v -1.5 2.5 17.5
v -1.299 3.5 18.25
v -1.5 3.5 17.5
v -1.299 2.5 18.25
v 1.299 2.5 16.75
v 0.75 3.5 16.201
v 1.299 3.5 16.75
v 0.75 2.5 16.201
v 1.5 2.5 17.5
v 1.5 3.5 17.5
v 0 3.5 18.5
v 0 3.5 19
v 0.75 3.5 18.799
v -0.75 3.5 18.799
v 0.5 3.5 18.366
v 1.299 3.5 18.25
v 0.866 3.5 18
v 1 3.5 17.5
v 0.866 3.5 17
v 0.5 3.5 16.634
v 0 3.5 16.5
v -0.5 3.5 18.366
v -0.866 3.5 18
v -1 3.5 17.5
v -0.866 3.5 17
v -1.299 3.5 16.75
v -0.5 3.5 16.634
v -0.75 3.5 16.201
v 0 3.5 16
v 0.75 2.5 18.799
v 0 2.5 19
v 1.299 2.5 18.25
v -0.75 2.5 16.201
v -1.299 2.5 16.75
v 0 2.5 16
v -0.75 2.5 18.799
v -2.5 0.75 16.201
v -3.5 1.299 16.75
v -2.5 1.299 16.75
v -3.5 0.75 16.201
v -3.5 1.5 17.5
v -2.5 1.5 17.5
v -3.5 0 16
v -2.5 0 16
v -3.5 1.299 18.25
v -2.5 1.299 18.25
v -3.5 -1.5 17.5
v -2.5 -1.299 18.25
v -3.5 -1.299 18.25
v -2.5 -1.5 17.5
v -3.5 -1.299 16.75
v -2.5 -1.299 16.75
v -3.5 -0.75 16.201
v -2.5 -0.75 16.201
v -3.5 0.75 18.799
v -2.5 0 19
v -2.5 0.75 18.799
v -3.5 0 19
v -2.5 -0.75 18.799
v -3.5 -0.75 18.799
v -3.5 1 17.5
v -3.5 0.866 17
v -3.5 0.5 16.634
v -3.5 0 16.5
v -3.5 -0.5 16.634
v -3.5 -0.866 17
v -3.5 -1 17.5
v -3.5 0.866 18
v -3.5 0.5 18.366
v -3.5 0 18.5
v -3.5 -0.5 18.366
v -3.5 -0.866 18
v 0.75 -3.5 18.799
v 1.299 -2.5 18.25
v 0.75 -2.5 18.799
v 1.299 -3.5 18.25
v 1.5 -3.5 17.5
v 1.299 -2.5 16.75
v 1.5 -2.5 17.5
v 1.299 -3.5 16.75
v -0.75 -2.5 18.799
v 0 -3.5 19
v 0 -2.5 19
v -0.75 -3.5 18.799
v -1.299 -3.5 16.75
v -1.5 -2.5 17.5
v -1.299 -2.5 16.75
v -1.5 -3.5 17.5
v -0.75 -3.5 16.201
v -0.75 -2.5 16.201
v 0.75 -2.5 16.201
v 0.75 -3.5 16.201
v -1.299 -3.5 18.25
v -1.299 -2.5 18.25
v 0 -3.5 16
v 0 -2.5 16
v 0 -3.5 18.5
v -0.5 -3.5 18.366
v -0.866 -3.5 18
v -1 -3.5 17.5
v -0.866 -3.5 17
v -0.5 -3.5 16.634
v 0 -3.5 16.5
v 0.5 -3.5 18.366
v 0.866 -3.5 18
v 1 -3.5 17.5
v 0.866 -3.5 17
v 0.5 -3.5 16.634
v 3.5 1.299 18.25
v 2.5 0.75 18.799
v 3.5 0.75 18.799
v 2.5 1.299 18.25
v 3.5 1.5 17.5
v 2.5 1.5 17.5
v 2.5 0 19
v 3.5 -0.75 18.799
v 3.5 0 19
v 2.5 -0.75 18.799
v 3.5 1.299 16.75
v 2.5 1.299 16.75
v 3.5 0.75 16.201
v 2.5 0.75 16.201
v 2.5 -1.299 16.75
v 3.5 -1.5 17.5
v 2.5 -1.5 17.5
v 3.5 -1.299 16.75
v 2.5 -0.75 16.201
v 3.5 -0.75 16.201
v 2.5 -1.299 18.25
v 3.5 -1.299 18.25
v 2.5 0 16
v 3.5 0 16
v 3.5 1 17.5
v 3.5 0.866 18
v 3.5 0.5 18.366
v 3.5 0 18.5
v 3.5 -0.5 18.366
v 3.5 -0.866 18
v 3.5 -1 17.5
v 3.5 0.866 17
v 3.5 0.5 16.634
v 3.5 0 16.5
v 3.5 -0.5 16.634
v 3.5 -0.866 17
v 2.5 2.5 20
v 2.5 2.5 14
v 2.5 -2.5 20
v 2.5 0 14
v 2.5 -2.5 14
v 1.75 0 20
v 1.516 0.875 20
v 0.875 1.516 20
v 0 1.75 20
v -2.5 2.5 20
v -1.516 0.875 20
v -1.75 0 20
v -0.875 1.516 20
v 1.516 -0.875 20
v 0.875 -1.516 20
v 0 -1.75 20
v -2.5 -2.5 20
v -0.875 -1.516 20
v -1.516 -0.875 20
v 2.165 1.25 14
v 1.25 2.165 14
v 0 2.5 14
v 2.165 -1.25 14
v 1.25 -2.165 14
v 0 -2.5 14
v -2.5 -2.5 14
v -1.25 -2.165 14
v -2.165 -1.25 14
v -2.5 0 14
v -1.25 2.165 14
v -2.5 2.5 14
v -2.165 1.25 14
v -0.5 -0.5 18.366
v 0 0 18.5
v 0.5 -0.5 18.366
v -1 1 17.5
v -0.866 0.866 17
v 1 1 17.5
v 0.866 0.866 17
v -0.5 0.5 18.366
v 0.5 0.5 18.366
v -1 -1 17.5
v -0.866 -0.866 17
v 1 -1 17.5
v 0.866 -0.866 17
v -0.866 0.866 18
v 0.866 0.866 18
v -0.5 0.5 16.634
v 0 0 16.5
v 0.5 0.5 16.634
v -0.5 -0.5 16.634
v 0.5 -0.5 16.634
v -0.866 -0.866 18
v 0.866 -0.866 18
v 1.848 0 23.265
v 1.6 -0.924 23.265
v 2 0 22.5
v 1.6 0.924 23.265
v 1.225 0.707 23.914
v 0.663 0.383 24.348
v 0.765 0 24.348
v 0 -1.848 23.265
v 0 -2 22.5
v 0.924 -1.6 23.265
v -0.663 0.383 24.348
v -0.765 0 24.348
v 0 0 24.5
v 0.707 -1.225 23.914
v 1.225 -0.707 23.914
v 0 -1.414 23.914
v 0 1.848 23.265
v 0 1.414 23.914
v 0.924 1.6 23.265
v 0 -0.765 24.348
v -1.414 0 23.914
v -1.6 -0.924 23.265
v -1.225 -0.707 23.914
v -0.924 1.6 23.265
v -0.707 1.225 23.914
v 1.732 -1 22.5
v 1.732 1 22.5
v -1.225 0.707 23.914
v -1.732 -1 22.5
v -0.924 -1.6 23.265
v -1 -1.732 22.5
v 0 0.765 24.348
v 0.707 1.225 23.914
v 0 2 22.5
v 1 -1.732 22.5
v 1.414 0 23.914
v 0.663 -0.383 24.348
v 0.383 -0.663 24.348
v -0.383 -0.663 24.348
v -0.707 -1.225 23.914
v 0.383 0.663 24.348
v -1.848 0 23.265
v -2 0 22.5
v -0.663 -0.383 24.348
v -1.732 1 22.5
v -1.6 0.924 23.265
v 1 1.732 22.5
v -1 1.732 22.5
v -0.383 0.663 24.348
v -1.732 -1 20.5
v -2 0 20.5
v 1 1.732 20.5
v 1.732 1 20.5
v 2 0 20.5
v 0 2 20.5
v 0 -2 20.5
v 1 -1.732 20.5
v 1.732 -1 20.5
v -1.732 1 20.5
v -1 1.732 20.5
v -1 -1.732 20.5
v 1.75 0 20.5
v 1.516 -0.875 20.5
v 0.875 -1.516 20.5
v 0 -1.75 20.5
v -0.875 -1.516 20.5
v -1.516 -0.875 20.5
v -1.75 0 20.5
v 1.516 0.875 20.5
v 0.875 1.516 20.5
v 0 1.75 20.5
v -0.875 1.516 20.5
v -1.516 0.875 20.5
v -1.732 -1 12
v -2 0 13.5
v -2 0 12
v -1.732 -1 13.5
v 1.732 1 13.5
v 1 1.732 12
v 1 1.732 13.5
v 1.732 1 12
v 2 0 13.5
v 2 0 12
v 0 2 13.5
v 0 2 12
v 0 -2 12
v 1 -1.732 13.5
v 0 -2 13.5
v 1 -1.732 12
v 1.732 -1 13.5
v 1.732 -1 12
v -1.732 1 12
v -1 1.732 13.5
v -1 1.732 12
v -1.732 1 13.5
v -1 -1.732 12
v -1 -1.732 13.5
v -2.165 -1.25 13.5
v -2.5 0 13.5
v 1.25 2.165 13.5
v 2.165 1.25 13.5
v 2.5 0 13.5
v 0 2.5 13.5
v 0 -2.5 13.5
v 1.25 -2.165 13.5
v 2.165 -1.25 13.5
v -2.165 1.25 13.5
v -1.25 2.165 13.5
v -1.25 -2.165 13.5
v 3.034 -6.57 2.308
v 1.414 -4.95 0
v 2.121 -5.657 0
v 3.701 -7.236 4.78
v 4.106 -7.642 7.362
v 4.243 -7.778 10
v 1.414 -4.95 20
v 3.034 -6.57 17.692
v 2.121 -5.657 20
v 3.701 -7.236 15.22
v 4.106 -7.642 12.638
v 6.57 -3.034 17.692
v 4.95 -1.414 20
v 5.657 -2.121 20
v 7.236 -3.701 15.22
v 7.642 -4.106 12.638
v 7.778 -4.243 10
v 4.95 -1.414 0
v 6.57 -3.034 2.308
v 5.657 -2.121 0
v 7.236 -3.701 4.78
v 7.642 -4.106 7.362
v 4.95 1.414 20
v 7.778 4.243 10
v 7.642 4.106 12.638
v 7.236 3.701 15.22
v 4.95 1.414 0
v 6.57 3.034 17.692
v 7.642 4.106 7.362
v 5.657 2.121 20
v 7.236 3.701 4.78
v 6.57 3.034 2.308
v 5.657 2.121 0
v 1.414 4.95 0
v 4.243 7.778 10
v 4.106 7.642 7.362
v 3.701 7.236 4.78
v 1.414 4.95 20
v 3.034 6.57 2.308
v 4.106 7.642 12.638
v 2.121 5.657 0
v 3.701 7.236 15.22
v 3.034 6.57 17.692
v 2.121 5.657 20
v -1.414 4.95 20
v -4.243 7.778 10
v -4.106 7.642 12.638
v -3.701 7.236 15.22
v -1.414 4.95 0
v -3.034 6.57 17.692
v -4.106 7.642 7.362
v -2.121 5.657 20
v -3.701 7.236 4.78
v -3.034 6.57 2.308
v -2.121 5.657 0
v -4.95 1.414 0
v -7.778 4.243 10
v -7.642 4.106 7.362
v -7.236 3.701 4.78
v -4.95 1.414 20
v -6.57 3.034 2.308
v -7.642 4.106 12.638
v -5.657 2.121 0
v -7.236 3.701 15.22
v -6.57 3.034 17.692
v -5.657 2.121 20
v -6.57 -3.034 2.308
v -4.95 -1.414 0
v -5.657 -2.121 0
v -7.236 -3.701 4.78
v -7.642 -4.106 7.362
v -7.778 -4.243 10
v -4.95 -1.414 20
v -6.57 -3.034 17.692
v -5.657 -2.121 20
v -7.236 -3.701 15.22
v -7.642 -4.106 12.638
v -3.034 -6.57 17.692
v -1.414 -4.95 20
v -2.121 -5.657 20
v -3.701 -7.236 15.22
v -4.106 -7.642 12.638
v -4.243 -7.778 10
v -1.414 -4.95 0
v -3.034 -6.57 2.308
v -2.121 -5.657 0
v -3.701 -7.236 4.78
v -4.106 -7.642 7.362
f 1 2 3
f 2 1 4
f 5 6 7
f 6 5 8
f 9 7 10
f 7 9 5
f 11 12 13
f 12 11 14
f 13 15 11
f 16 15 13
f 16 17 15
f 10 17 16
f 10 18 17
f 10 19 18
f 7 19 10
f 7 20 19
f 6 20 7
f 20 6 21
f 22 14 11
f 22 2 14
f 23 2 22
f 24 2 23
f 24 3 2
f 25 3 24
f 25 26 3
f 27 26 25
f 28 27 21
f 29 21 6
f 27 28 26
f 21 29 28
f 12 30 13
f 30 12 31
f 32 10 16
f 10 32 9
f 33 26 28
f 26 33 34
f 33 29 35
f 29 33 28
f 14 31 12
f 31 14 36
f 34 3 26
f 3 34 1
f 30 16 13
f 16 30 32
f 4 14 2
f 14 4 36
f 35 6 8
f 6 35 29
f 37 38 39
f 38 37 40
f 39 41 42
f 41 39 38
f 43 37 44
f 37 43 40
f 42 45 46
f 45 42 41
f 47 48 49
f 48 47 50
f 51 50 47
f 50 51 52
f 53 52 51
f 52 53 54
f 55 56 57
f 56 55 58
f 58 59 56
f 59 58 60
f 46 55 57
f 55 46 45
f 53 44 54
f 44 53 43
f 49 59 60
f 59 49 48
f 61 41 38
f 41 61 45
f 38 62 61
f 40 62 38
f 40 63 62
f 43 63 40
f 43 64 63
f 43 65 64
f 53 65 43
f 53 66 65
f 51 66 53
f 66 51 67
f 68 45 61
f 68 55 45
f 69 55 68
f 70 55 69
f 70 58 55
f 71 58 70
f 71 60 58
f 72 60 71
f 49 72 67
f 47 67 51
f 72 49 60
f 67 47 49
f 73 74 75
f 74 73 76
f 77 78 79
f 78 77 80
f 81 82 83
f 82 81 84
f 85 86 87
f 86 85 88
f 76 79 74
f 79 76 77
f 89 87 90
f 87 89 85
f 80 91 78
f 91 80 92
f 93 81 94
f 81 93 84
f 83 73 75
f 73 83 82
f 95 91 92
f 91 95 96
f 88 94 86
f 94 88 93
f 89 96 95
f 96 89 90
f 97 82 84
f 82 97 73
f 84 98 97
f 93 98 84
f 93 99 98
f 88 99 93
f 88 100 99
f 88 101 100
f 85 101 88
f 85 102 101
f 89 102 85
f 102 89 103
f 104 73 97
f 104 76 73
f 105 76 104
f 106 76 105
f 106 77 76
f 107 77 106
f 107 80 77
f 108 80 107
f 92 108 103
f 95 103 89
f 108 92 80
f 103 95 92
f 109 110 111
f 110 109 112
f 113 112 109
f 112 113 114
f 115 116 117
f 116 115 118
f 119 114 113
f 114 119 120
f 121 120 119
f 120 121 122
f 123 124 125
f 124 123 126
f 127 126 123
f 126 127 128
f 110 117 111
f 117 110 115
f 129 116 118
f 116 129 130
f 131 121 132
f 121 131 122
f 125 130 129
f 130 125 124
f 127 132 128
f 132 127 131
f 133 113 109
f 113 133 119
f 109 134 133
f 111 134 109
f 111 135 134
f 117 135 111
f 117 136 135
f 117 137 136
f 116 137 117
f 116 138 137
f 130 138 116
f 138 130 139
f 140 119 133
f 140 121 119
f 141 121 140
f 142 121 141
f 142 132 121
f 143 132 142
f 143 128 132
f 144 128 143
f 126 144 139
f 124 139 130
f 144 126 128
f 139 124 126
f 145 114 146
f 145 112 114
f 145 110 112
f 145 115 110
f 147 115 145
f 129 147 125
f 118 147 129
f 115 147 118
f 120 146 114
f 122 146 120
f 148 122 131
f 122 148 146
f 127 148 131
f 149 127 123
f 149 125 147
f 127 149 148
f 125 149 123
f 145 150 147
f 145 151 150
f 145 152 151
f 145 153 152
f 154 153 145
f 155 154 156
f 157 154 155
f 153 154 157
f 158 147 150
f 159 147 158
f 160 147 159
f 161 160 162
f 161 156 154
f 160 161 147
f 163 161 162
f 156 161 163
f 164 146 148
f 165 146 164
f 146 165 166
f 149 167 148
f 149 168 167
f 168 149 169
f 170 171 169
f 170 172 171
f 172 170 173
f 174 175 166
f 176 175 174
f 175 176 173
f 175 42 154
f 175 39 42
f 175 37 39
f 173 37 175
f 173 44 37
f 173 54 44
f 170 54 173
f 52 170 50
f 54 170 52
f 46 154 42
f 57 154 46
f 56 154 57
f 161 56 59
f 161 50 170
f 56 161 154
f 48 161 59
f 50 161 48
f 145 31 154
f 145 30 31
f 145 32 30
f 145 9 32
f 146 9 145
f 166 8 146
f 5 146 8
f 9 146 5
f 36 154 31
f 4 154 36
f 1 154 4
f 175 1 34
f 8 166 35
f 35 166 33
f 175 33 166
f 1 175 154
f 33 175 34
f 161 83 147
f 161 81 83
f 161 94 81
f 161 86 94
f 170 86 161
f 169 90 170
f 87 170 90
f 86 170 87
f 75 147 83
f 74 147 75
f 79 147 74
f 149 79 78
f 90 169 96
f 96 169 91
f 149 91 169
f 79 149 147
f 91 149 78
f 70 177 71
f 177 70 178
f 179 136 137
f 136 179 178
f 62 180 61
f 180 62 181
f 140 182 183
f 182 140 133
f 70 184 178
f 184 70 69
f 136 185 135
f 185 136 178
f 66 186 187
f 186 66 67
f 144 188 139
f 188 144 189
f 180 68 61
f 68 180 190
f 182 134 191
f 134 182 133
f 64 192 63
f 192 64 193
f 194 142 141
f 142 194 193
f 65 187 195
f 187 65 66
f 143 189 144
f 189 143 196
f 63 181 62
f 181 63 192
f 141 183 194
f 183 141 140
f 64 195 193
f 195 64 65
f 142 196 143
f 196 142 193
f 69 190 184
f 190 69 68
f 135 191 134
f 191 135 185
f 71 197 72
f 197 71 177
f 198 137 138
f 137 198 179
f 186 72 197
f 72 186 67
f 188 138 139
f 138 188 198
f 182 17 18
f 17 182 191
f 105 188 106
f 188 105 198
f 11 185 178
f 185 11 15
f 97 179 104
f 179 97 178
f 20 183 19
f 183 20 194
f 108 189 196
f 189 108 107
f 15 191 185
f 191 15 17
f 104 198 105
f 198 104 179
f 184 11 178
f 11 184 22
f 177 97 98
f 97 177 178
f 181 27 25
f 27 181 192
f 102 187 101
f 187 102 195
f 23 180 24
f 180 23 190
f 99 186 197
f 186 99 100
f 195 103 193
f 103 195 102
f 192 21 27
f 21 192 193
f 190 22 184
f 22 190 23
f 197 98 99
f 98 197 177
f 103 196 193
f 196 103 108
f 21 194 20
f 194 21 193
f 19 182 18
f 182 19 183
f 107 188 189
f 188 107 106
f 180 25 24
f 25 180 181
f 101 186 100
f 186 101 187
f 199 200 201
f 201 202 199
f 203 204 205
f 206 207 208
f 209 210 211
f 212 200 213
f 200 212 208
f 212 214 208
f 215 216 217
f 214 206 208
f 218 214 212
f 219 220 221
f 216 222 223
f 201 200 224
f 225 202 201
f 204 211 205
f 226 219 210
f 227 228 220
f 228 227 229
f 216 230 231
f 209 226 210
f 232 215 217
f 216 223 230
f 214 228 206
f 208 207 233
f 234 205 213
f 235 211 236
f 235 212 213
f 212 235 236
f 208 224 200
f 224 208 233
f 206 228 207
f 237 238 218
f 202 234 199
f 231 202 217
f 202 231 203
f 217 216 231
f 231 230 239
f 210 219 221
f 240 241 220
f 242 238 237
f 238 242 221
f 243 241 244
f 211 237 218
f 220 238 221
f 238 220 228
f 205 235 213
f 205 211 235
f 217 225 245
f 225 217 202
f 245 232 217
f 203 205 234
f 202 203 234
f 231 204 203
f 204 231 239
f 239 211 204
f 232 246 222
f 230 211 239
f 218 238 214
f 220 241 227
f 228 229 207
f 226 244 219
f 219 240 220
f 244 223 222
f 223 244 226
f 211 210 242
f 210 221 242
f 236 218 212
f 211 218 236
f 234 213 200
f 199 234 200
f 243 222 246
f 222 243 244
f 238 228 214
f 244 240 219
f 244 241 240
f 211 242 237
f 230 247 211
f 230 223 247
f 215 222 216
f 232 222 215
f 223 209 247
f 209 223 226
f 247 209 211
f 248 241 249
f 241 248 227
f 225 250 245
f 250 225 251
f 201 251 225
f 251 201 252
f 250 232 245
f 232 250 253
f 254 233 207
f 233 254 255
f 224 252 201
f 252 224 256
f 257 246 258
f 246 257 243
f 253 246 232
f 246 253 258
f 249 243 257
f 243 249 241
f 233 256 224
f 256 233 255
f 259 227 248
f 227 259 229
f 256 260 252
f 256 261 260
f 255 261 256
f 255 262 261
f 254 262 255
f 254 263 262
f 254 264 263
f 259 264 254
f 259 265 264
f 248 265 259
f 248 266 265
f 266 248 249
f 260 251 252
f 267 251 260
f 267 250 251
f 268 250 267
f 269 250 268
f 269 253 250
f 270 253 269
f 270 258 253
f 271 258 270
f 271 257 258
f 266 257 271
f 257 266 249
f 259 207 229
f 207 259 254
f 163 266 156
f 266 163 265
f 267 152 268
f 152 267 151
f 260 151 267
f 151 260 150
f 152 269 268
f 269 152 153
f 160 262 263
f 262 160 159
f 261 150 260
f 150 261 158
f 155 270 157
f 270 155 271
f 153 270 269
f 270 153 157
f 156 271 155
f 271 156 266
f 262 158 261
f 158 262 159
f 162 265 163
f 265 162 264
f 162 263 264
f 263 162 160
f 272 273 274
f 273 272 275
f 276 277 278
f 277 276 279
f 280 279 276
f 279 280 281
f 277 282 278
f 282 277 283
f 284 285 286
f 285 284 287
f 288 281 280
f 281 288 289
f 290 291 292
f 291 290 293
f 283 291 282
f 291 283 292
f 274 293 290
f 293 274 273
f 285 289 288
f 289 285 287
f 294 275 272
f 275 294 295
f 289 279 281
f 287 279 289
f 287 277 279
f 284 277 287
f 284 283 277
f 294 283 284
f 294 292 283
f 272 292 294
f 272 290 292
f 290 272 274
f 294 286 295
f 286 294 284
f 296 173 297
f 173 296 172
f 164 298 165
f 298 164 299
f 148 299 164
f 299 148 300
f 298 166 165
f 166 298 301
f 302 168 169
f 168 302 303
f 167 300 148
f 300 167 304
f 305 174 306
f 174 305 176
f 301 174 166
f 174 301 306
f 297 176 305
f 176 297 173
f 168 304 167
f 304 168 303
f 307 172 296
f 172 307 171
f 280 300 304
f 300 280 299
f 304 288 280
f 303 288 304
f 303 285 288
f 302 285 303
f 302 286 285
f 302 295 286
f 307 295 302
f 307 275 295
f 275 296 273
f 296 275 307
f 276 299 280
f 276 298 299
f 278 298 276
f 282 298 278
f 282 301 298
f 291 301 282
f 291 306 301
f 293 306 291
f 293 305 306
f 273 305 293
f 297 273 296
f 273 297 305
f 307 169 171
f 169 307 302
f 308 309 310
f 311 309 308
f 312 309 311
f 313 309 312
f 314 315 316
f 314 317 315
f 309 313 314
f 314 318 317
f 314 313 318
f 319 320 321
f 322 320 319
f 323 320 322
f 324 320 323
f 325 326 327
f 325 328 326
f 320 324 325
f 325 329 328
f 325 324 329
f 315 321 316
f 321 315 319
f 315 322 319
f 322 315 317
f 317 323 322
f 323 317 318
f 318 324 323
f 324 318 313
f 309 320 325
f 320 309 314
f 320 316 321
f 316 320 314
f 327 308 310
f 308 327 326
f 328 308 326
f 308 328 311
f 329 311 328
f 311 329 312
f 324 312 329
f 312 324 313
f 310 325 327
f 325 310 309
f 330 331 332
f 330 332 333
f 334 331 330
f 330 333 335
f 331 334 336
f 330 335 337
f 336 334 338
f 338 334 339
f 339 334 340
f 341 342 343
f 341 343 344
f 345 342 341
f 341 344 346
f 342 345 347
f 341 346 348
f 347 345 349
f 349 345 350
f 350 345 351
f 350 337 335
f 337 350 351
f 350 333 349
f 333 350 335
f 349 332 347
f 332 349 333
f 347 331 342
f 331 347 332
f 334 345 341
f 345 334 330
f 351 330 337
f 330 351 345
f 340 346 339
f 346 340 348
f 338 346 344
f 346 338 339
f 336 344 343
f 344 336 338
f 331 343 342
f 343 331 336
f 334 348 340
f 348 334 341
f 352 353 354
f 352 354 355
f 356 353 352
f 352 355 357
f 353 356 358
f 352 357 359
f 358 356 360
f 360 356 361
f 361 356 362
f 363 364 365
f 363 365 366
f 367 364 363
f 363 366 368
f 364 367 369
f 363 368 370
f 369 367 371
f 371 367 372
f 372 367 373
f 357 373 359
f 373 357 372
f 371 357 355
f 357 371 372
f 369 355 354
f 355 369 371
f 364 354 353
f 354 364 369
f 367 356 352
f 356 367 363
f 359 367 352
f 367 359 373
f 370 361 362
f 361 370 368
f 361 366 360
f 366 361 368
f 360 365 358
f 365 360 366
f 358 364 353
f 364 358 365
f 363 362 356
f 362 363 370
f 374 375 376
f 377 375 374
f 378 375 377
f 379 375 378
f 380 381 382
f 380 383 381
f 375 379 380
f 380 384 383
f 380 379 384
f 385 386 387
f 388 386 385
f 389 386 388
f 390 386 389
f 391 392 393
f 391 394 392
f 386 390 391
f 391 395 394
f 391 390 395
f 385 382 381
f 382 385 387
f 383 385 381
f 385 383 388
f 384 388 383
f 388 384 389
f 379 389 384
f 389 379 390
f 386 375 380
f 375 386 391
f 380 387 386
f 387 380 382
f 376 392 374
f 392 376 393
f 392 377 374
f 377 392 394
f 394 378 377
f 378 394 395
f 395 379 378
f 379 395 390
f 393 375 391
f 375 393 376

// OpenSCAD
// file: ../kal/bricks_bow/plate_bow_1x4_double.scad
// plate_bow_1x4_double

// external vars #########################

ext_scale = 1.0;
ext_fn = 12;

// part ##################################

module plate_bow_1x4_double(m_scale=ext_scale,m_fn=ext_fn) {
    scale([m_scale,m_scale,m_scale])
    translate([-2.5,0,0]) rotate([0,0,90])
    union() {
        pts_base = [[10,1],[10,0],[5,0],[5,2],[-1,2],[0,4]];
        hyp_bow = sqrt(109);
        r_bow = (hyp_bow/2)/(3/hyp_bow);
        u_bow = r_bow-4;
        ang_bow = (90-acos(3/hyp_bow))*2;
        div = m_fn/3;
        pts_arc = [for (i=[1:div-1]) let (ang = 90-(ang_bow/div)*i) [cos(ang)*r_bow,sin(ang)*r_bow-u_bow]];
        pts = concat(pts_base,pts_arc);
        rotate([90,0,0]) linear_extrude(height=5) polygon(pts);
        mirror([1,0,0]) rotate([90,0,0]) linear_extrude(height=5) polygon(pts);
    }
}

plate_bow_1x4_double();
// file: ../kal/plates/plate_1x2.scad
// plate 1x2

// external vars #########################

ext_scale = 1.0;
ext_fn = 12;

// part ##################################

module plate_1x2(m_scale=ext_scale,m_fn=ext_fn) {
    scale([m_scale,m_scale,m_scale])
    translate([-2.5,-5,0])
    cube([5,10,2]);
}

plate_1x2();
// file: ../kal/plates_round/plate_round_1x1_wo_stud.scad
// plate round 1x1 wo stud

// external vars #########################

ext_scale = 1.0;
ext_fn = 12;

// part ##################################

module plate_round_1x1_wo_stud(m_scale=ext_scale,m_fn=ext_fn) {
    scale([m_scale,m_scale,m_scale])
    union() {
        cylinder(h=2,d=4,center=false,$fn=m_fn);
        translate([0,0,1.5])
        cylinder(h=0.5,d=5,center=false,$fn=m_fn);
    }
}

plate_round_1x1_wo_stud();
// file: ../kal/electric/globe_1x1.scad
// globe 1x1

// external vars #########################

ext_scale = 1.0;
ext_fn = 12;

// part ##################################

module globe_1x1(m_scale=ext_scale,m_fn=ext_fn) {
    scale([m_scale,m_scale,m_scale])
    union() {
        pts_base = [[2,0],[0,-1],[0,2]];
        div = m_fn/3;
        pts_arc = [for (i=[1:div-1]) let (ang = 90-(90/div)*i) [cos(ang)*2,sin(ang)*2]];
        pts = concat(pts_base,pts_arc);
        translate([0,0,2.5]) rotate([0,0,180])
        rotate_extrude(angle=360,$fn=m_fn) polygon(pts);
        translate([0,0,0.5]) cylinder(h=2,d=4,center=false,$fn=m_fn);
        cylinder(h=1,d=3.5,center=false,$fn=m_fn);
    }
}

globe_1x1();
// file: ../kal/bricks_special/brick_1x1_4_side_stud_w_holes.scad
// brick 1x1 4 side stud w holes

// external vars #########################

ext_scale = 1.0;
ext_fn = 12;

// part ##################################

module brick_1x1_4_side_stud_w_holes(m_scale=ext_scale,m_fn=ext_fn) {
    scale([m_scale,m_scale,m_scale])
    difference() {
        union() {
            translate([-2.5,-2.5,0]) cube([5,5,6],center=false);
            for (i = [0:3]) {
                rotate([0,0,90*i]) translate([0,2,3.5])
                rotate([-90,0,0]) cylinder(h=1.5,d=3,center=false,$fn=m_fn);
            }
        }
        translate([-4,0,3.5]) rotate([0,90,0])
        cylinder(h=8,d=2,center=false,$fn=m_fn);
        translate([0,4,3.5]) rotate([90,0,0])
        cylinder(h=8,d=2,center=false,$fn=m_fn);
    }
}

brick_1x1_4_side_stud_w_holes();
// main file
// courge basic
// nb parts : 11

// uses ##################################

use <../kal/bricks_special/brick_1x1_4_side_stud_w_holes.scad>;
use <../kal/electric/globe_1x1.scad>;
use <../kal/plates_round/plate_round_1x1_wo_stud.scad>;
use <../kal/plates/plate_1x2.scad>;
use <../kal/bricks_bow/plate_bow_1x4_double.scad>;

// external vars #########################

id_part = -1;

// internal modules ######################

module leg(rot,pieces) {
  rotate([0,0,90*rot]) translate([0,-4.5,-4]) rotate([90,0,0])
  if (pieces == 0) color("Orange") plate_1x2();
  else color("Brown") plate_bow_1x4_double();
}

// part ##################################

module parts(id_part=-1,all=false) {
  translate([0,0,14]) {
    if (id_part == 0 || all) color("Brown") brick_1x1_4_side_stud_w_holes();
    if (id_part == 1 || all) translate([0,0,6]) color("Green") globe_1x1();
    if (id_part == 2 || all) translate([0,0,-2]) color("Lime") plate_round_1x1_wo_stud();
    rotate([0,0,45]) {
      if (id_part == 3 || all) leg(0,0);
      if (id_part == 4 || all) leg(1,0);
      if (id_part == 5 || all) leg(2,0);
      if (id_part == 6 || all) leg(3,0);
      if (id_part == 7 || all) leg(0,1);
      if (id_part == 8 || all) leg(1,1);
      if (id_part == 9 || all) leg(2,1);
      if (id_part == 10 || all) leg(3,1);
    }
  }
}

if (id_part > -1) parts(id_part=id_part);
else parts(all=true);
